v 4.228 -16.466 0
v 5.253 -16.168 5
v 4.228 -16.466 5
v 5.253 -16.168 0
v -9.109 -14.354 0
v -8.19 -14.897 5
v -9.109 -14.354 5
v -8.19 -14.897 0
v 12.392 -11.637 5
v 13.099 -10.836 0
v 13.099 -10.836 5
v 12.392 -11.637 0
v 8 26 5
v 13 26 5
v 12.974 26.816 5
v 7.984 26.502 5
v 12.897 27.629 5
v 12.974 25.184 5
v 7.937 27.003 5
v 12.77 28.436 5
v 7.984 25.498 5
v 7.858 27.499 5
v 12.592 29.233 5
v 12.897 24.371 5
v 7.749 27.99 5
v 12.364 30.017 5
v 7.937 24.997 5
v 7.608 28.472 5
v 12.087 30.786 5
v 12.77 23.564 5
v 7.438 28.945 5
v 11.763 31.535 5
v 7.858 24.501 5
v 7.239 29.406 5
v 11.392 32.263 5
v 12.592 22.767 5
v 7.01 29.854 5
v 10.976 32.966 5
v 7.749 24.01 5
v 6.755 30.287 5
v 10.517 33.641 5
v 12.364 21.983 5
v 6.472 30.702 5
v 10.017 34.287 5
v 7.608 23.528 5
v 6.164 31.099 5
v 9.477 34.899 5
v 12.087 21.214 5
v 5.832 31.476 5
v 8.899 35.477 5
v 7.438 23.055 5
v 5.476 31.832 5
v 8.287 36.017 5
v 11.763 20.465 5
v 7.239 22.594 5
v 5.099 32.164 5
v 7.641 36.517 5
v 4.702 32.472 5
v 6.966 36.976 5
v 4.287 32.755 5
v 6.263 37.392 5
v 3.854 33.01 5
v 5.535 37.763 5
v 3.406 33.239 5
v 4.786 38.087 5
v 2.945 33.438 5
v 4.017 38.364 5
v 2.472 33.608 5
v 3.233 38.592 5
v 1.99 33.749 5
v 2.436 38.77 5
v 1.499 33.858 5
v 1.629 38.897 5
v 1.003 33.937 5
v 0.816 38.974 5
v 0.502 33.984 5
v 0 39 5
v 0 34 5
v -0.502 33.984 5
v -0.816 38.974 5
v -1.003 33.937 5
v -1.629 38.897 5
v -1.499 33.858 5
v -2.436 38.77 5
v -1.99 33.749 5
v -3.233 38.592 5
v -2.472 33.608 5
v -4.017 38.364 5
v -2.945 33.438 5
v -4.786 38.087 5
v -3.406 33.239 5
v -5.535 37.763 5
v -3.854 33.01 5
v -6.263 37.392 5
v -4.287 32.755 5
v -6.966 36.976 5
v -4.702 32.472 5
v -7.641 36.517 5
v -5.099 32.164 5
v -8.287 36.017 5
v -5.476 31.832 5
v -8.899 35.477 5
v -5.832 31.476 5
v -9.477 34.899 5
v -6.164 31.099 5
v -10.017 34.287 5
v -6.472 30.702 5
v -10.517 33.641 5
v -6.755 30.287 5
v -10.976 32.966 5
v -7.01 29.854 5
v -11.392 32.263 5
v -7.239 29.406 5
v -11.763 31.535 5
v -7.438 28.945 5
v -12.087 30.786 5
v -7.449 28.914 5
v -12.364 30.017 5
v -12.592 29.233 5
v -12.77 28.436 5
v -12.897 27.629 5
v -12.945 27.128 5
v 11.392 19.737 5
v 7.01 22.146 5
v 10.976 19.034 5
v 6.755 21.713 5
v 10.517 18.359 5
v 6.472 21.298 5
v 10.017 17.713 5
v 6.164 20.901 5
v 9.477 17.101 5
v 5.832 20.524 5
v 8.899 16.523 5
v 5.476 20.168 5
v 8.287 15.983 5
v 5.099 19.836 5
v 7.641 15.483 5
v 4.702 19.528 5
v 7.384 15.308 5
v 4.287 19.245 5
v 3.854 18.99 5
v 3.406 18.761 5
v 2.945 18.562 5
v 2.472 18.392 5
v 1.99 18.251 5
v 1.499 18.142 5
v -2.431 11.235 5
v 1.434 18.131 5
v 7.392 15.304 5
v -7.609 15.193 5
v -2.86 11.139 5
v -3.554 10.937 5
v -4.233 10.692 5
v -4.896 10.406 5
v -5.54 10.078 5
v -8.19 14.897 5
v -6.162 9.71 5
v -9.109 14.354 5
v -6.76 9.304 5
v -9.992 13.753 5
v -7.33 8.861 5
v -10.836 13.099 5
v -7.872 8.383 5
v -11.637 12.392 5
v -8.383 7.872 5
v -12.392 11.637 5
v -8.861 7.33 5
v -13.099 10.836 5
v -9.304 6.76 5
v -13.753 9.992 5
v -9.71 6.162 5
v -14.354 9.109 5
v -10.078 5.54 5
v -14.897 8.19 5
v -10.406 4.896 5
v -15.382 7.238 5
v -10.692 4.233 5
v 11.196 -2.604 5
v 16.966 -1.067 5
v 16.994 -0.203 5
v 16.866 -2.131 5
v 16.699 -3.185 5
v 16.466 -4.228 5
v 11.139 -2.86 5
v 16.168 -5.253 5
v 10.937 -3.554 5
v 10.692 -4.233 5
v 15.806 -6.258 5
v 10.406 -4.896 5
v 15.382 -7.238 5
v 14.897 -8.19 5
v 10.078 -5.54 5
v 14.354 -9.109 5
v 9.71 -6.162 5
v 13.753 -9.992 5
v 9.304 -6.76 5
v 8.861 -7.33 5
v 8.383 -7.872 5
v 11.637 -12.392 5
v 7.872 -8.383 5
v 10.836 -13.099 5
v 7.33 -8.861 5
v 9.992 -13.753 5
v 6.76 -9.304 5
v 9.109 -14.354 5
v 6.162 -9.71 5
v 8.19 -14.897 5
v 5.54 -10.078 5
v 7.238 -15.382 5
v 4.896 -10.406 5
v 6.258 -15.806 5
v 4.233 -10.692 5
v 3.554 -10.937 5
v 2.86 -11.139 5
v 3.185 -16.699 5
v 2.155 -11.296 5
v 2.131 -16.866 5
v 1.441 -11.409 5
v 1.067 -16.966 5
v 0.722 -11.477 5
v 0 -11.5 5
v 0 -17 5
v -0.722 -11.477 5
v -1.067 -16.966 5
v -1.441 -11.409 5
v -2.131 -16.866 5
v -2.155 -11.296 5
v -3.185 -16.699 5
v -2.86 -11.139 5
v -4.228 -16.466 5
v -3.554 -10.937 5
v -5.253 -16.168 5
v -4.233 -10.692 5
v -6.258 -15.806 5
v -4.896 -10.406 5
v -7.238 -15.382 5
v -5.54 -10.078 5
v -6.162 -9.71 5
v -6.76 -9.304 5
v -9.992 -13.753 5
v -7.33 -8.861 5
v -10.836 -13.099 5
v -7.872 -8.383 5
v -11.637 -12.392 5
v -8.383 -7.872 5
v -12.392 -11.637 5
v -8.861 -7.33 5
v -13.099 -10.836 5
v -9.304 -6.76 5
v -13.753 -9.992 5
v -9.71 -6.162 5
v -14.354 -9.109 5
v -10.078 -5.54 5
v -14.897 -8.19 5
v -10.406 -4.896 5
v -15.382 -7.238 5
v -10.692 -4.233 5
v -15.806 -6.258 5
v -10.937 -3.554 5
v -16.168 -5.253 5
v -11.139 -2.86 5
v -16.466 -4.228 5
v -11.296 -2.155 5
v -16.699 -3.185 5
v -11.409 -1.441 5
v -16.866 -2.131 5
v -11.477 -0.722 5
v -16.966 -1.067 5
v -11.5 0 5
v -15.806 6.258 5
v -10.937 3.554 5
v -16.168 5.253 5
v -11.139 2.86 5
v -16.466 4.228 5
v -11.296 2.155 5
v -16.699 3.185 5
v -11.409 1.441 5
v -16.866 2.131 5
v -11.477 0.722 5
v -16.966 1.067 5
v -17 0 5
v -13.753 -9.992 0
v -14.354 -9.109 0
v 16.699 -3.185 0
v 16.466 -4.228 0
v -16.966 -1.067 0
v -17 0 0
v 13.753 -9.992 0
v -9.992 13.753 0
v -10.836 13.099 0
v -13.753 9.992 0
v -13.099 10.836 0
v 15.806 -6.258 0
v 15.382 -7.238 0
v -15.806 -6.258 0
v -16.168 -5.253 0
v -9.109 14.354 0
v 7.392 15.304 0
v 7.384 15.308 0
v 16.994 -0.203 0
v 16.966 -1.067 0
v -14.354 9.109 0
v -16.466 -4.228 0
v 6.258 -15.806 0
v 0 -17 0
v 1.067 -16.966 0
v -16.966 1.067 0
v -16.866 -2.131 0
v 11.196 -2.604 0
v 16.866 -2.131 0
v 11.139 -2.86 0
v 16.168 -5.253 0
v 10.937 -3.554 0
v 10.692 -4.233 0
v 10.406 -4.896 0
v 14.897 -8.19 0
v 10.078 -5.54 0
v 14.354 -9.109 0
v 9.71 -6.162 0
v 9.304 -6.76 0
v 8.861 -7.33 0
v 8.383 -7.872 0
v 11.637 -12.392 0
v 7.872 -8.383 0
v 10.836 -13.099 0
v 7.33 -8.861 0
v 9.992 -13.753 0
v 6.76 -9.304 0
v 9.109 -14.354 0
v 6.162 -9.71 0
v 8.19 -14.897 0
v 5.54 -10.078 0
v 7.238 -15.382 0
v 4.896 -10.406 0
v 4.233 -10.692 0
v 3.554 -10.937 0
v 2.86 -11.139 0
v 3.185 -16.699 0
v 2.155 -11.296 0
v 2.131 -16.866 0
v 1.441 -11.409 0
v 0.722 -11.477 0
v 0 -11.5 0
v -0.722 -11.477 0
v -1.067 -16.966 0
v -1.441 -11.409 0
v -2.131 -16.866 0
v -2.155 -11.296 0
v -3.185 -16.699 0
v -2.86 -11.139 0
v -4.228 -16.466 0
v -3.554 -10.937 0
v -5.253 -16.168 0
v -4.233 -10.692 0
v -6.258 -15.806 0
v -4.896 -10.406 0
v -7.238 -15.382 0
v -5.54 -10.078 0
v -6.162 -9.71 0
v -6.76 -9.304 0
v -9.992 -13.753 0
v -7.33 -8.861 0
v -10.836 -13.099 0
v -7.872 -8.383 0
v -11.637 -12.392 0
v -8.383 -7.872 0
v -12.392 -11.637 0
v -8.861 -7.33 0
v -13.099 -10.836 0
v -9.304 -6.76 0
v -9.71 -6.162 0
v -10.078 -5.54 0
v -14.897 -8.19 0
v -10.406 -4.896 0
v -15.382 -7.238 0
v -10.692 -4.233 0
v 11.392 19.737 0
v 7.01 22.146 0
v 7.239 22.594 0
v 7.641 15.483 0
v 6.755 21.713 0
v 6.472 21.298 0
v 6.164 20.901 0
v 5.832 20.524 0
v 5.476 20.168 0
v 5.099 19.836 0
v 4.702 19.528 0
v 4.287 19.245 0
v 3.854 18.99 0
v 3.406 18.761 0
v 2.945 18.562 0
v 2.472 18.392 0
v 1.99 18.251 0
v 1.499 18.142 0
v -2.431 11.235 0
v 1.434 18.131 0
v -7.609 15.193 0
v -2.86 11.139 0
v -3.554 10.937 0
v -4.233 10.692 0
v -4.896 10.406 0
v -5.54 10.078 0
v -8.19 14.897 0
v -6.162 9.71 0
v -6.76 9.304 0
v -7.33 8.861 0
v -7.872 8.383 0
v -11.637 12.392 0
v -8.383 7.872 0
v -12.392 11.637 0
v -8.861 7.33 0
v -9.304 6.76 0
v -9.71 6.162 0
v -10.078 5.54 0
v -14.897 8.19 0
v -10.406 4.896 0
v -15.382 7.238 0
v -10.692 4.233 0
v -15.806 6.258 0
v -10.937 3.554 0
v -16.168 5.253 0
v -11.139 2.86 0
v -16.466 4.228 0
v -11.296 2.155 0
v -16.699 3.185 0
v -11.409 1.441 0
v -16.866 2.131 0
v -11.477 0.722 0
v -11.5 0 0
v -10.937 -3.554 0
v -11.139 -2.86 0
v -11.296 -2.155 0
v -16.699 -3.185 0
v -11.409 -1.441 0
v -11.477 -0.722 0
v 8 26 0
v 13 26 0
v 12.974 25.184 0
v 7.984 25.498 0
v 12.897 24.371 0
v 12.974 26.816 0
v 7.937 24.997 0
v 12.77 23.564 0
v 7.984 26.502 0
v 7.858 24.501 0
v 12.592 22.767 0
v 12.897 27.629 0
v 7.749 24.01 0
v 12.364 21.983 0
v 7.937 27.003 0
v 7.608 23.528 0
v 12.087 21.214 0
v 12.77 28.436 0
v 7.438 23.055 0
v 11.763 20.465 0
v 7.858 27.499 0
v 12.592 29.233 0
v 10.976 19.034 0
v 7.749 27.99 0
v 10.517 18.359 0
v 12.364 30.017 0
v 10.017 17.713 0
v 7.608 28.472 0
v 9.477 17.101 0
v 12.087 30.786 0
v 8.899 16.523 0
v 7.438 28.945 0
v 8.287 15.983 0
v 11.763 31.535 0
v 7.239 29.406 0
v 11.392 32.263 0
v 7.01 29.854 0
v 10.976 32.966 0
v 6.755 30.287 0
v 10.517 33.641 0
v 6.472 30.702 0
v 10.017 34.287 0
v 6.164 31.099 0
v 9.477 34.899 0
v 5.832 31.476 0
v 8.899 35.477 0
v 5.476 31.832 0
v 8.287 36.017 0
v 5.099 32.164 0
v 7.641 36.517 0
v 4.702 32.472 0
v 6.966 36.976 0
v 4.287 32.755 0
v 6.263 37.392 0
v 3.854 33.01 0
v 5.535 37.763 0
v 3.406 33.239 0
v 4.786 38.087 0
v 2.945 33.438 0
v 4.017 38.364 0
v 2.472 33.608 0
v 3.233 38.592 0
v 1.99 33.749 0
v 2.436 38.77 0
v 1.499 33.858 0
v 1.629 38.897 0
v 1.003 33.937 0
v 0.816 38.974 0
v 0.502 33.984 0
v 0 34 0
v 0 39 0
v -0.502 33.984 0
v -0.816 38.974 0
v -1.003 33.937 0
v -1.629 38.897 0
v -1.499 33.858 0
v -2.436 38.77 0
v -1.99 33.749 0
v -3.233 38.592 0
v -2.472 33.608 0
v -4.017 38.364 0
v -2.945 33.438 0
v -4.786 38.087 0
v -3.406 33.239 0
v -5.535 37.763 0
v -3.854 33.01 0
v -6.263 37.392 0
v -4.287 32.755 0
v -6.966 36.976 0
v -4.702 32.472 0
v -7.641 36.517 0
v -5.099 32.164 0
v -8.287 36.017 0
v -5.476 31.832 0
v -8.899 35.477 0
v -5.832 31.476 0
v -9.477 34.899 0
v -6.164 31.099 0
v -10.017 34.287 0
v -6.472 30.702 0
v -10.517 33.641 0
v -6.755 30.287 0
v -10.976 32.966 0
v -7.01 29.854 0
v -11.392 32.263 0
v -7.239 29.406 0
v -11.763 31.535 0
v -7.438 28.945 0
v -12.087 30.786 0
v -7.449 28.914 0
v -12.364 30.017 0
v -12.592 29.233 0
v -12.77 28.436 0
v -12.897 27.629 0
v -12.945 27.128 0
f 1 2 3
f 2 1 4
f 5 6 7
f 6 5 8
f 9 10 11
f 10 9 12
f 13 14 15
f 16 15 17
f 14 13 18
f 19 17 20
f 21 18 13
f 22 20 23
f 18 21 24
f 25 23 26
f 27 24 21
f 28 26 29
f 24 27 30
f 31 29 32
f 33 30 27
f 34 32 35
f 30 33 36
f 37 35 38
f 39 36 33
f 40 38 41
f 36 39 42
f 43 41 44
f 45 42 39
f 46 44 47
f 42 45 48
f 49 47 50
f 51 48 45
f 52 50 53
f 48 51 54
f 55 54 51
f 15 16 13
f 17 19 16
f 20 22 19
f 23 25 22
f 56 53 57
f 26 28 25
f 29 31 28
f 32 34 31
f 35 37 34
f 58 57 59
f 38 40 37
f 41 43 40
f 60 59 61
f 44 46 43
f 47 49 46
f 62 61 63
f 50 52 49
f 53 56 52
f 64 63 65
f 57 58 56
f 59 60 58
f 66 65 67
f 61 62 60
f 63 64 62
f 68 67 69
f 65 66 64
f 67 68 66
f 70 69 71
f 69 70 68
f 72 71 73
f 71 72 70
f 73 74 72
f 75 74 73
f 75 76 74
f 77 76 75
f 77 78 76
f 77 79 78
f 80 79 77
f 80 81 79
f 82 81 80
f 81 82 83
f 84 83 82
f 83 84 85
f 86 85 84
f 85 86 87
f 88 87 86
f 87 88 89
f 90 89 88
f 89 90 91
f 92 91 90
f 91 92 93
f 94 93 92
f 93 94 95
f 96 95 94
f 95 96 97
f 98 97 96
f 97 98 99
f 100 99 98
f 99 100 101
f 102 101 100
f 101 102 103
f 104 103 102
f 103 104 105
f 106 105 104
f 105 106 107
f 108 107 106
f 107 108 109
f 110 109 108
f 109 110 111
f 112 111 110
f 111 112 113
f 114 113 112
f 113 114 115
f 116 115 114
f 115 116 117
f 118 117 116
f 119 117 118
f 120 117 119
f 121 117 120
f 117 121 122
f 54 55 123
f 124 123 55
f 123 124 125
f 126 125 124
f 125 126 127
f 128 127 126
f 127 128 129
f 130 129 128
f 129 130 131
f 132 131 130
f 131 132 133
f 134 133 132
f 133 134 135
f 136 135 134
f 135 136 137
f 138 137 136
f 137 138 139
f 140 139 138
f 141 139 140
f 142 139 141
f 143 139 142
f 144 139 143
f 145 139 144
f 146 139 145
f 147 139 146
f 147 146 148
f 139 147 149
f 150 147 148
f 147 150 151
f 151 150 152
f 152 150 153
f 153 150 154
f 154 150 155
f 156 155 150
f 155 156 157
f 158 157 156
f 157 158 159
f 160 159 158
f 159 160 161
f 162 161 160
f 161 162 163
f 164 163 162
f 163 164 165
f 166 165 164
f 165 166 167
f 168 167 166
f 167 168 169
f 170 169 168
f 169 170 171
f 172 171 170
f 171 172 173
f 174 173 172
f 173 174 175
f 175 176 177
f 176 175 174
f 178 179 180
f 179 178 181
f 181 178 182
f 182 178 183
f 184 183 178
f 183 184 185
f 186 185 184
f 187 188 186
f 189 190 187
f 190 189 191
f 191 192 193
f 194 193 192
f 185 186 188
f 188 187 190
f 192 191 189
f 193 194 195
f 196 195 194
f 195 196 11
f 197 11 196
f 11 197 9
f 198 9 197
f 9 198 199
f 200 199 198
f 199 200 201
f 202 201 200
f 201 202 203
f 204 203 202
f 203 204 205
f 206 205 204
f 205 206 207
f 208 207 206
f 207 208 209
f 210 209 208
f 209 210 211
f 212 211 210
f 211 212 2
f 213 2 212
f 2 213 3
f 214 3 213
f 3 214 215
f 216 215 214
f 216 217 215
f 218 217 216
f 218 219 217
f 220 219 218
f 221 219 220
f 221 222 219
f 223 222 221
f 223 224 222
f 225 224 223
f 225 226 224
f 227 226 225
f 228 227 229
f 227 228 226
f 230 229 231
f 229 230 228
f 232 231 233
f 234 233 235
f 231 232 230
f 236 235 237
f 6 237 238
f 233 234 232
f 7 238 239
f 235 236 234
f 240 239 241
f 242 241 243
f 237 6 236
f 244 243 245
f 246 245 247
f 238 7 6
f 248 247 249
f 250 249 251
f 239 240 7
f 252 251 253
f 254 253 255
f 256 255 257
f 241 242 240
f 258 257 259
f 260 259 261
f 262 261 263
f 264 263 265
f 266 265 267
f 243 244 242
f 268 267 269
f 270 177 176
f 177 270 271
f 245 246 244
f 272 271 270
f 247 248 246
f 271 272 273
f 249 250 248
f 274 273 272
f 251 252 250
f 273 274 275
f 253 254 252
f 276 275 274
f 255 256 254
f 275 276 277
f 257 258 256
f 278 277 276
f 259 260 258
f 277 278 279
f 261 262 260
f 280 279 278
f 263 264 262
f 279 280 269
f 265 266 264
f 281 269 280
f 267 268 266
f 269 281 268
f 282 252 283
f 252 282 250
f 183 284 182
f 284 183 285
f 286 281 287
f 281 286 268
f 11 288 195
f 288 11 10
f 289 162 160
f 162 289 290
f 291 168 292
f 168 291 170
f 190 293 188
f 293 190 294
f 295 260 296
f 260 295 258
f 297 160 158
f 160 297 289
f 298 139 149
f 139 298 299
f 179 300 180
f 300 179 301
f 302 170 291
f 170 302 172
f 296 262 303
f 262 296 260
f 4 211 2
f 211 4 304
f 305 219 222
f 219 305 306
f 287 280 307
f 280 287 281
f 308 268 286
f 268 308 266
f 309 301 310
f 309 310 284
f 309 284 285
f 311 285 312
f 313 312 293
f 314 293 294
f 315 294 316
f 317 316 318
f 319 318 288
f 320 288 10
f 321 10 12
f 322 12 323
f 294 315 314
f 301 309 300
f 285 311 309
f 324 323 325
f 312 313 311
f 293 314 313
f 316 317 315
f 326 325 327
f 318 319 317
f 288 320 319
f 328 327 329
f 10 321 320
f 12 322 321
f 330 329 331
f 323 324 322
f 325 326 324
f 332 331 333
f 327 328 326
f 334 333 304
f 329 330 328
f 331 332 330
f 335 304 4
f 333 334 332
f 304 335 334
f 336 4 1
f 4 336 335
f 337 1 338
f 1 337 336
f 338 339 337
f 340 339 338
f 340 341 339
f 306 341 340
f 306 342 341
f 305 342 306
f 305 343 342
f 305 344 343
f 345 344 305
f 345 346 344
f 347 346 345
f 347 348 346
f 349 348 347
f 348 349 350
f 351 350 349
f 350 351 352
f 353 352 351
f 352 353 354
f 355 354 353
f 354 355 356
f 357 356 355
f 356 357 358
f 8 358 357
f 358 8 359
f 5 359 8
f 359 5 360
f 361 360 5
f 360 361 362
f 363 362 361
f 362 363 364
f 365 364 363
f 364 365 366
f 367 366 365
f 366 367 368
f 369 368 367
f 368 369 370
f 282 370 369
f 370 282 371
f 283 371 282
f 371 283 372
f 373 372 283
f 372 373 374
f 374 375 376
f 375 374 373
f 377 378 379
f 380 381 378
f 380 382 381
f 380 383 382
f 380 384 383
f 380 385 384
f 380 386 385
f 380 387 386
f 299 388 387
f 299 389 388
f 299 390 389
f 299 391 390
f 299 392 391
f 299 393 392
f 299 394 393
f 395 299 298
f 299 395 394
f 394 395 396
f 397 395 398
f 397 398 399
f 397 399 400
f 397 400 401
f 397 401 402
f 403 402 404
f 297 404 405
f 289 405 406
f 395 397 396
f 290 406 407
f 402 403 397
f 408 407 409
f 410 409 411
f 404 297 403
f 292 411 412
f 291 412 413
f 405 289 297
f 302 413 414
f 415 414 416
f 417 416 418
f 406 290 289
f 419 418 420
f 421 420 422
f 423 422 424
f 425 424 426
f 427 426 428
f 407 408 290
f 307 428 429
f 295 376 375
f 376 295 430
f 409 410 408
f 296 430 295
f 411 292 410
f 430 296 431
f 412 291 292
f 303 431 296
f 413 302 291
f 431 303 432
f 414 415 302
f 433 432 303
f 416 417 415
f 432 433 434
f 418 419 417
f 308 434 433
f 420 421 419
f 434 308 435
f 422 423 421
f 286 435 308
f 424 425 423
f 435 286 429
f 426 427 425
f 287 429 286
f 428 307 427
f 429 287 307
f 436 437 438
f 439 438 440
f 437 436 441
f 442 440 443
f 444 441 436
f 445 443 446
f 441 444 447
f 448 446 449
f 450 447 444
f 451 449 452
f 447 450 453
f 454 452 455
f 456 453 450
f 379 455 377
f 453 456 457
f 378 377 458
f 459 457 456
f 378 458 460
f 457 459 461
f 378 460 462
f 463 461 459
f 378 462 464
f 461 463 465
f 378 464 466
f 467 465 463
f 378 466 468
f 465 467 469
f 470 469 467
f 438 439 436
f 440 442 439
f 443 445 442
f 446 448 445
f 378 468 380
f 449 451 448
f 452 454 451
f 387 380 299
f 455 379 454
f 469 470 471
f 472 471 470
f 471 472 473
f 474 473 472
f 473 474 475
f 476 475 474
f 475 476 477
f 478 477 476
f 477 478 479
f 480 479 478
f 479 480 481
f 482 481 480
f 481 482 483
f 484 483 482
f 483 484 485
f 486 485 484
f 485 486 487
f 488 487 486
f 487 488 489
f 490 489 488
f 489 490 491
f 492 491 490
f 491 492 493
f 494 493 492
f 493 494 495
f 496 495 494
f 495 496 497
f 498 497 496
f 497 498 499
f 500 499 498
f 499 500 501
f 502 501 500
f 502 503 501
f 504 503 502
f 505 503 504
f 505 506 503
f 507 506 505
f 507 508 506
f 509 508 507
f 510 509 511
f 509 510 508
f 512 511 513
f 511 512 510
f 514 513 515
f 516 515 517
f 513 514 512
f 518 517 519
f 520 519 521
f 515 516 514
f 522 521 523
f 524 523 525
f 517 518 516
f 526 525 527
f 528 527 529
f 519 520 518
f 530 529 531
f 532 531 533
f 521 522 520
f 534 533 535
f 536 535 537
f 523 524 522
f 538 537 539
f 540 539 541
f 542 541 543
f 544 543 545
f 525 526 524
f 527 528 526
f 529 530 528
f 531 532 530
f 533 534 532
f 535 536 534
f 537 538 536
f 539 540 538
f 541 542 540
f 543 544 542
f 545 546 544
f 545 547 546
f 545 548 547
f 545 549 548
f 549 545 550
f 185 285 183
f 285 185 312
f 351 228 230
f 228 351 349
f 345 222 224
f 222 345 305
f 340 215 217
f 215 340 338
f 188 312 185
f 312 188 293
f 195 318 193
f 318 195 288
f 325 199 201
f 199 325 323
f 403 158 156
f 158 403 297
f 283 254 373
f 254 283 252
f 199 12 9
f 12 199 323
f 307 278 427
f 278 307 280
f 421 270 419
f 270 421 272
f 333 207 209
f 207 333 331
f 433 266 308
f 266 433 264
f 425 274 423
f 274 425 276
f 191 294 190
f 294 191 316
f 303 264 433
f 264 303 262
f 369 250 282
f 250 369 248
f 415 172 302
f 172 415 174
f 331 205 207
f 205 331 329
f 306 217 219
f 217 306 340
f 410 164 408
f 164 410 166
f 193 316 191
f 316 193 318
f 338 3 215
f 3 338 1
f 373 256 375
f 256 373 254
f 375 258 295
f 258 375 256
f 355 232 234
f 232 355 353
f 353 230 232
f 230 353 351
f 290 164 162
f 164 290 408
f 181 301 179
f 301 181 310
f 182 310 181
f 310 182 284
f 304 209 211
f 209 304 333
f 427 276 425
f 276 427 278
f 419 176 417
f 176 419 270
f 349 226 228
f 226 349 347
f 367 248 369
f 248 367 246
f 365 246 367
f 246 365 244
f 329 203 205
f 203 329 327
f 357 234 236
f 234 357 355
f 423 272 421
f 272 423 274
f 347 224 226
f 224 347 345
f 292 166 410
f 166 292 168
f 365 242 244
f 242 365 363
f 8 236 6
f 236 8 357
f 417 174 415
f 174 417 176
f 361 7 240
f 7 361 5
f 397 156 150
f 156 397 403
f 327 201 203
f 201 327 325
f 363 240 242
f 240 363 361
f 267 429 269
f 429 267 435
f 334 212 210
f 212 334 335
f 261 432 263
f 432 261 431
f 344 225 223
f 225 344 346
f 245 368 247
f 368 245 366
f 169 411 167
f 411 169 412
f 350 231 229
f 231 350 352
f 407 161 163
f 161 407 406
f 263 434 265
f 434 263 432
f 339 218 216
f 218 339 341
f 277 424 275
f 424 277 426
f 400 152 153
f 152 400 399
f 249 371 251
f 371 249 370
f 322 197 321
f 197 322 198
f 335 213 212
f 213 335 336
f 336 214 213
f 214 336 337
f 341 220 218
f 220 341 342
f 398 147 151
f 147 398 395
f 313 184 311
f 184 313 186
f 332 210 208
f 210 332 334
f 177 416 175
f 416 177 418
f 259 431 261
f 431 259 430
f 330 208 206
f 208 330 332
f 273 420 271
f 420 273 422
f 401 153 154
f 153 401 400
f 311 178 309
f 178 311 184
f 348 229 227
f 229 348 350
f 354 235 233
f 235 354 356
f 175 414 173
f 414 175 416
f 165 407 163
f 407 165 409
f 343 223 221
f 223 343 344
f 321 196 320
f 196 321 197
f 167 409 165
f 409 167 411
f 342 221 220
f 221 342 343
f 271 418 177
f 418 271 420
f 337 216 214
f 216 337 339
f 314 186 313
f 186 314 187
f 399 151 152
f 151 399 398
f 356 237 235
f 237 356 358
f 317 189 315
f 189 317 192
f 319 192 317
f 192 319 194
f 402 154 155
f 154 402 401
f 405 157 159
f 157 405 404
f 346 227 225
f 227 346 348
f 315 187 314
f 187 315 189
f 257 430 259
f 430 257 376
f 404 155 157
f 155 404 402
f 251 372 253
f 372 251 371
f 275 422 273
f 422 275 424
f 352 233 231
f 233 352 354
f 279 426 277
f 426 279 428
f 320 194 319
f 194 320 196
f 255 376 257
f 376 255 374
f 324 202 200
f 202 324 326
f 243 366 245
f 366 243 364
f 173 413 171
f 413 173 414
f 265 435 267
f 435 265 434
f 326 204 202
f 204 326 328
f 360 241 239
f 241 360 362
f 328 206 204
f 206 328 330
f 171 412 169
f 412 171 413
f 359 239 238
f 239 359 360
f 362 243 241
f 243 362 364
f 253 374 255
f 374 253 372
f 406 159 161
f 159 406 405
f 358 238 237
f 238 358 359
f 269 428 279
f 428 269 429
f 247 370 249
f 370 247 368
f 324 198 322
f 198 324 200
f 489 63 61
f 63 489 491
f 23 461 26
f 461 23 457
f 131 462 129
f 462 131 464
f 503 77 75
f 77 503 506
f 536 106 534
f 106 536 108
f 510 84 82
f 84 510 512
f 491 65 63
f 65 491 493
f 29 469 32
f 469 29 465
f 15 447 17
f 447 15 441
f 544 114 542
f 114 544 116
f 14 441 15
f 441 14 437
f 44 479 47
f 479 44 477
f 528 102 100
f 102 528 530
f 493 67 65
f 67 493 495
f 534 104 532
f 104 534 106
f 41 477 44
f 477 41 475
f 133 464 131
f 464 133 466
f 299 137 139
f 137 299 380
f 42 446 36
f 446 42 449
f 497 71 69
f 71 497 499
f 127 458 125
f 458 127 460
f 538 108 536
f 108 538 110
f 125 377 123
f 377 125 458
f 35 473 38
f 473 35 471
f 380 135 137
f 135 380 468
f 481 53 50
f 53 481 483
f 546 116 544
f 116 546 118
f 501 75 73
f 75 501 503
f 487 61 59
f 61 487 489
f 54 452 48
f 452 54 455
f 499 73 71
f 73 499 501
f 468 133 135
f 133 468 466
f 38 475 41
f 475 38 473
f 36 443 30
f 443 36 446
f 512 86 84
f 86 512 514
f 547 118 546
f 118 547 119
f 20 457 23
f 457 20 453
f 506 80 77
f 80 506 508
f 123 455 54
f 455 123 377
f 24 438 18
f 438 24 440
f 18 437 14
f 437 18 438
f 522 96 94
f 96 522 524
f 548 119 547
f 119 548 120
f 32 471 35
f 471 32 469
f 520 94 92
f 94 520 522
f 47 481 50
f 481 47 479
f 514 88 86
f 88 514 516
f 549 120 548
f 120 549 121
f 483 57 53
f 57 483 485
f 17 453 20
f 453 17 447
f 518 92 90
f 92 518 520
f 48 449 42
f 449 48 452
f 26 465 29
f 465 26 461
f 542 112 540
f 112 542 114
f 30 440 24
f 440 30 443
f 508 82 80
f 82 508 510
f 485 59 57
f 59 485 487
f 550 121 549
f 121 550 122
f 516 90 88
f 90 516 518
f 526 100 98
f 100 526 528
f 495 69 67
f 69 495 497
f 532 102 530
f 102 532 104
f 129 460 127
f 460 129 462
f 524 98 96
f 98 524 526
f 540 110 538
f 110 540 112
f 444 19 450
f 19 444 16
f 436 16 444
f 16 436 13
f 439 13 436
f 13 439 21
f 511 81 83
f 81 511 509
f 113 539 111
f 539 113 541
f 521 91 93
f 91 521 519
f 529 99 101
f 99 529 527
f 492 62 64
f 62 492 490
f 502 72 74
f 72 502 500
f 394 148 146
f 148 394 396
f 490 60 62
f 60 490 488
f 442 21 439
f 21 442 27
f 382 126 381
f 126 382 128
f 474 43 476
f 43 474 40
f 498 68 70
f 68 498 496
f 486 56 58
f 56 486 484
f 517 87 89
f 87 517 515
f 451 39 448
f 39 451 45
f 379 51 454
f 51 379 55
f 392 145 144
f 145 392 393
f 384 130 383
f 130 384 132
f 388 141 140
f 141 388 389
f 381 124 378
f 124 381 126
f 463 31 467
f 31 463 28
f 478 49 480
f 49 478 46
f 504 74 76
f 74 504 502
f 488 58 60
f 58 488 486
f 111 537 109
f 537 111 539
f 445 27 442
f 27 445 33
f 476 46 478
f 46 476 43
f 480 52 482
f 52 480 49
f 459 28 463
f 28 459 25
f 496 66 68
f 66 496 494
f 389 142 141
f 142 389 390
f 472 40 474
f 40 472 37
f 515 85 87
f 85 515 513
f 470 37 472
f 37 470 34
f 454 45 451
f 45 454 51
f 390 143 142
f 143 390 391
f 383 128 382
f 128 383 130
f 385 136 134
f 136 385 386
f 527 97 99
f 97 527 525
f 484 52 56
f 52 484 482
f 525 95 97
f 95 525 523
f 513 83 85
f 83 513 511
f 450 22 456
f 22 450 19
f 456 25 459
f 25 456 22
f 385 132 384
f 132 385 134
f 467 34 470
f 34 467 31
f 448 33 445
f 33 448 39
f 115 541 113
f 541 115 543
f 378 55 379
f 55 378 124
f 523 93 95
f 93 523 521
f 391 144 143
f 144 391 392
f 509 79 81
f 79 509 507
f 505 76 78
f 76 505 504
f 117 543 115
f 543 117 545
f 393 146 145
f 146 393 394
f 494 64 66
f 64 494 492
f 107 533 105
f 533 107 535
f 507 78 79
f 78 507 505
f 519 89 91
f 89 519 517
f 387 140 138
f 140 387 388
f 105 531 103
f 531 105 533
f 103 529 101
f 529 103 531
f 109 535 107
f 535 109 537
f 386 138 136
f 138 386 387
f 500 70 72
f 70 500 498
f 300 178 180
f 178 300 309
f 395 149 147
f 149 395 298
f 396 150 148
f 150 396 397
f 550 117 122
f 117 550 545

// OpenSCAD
ROUNDING = 0;

TOP_INNER_DIA = 23 + 2 * ROUNDING;
TOP_OUTER_DIA = 34 - 2 * ROUNDING;
TOP_SLOT_WIDTH = 18;
TOP_SLOT_ANGLE = 22.5; //17.8;

BOT_INNER_DIA = 16 + 2 * ROUNDING;
BOT_OUTER_DIA = 26 - 2 * ROUNDING;
BOT_SLOT_WIDTH = 13;
BOT_SLOT_ANGLE = 198; // 192.3;

TOP_BOT_DIST = 26;
THICKNESS = 5 - 2 * ROUNDING;

$fn = 100;

module loop(outer, inner, thickness) {
  difference() {
    cylinder(d = outer, h = thickness);
    #cylinder(d = inner, h = thickness);
  }
}

module slot(dia, width, thickness) {
  hull() {
    cylinder(d = dia, h = thickness);
    translate([width, 0, 0])
    cylinder(d = dia, h = thickness);
  }
}

module hook() {
  difference() {
    union() {
      loop(TOP_OUTER_DIA, TOP_INNER_DIA, THICKNESS);
      translate([0, TOP_BOT_DIST, 0])
      loop(BOT_OUTER_DIA, BOT_INNER_DIA, THICKNESS);
    }

    #translate([0, (TOP_INNER_DIA - TOP_SLOT_WIDTH)/2, 0])
    rotate([0, 0, TOP_SLOT_ANGLE])
    slot(TOP_SLOT_WIDTH, TOP_OUTER_DIA, THICKNESS);

    #translate([0, TOP_BOT_DIST - (BOT_INNER_DIA - BOT_SLOT_WIDTH)/2, 0])
    rotate([0, 0, BOT_SLOT_ANGLE])
    slot(BOT_SLOT_WIDTH, BOT_OUTER_DIA, THICKNESS);
  }
}

minkowski() {
  hook();
  sphere(d=ROUNDING);
}
